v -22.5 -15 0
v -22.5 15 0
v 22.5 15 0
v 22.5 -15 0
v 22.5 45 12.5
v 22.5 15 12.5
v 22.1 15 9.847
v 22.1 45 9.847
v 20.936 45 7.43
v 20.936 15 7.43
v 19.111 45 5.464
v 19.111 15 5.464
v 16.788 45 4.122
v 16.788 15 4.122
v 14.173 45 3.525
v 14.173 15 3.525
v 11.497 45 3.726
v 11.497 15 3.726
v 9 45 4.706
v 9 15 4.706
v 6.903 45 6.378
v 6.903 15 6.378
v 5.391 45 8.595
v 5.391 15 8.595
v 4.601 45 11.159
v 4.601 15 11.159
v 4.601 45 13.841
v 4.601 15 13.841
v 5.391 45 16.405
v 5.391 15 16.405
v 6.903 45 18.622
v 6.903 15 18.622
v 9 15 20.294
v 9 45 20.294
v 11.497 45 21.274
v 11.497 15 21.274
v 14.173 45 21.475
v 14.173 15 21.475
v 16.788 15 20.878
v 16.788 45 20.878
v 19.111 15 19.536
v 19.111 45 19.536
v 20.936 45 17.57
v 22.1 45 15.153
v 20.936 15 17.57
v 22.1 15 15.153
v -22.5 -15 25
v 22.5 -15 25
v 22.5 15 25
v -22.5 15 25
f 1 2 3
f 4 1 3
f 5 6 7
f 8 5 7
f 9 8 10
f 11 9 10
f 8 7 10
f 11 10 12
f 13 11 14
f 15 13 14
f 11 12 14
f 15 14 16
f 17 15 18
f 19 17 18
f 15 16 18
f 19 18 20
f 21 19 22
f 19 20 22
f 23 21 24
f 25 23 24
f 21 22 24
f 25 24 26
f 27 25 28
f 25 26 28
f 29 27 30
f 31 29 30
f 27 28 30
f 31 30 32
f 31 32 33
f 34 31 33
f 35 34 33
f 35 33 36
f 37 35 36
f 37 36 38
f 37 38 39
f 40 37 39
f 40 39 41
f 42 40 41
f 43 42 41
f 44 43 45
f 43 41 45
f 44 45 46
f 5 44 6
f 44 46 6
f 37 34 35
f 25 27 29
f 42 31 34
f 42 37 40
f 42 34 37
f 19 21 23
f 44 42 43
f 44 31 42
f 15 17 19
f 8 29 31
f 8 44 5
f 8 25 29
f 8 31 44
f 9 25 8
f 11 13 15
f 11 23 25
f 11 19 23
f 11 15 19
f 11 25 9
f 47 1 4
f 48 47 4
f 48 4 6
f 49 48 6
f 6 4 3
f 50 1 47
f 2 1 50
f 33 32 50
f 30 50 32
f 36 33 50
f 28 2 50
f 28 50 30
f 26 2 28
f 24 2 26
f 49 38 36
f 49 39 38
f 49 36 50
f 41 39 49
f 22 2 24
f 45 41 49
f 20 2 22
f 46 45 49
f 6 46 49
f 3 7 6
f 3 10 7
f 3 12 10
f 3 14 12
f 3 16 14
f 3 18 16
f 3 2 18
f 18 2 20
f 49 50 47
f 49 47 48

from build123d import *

# Parameters (mm, degrees)
SKETCH1_W           = 45
SKETCH1_H           = 30
BOSS_EXTRUDE1_DEPTH = 25
SKETCH2_R           = 9
BOSS_EXTRUDE2_DEPTH = 30


with BuildPart() as part:
    # Sketch1 → Boss-Extrude1 (new body)
    with BuildSketch(Plane.XY):
        Rectangle(SKETCH1_W, SKETCH1_H)
    extrude(amount=BOSS_EXTRUDE1_DEPTH)

    # Sketch2 → Boss-Extrude2 (add)
    with BuildSketch(Plane(origin=(0, 15, 0), x_dir=(1, 0, 0), z_dir=(0, 1, 0))):
        with Locations((13.5, -12.5)):
            Circle(SKETCH2_R)
    extrude(amount=BOSS_EXTRUDE2_DEPTH)


solid = part.part
